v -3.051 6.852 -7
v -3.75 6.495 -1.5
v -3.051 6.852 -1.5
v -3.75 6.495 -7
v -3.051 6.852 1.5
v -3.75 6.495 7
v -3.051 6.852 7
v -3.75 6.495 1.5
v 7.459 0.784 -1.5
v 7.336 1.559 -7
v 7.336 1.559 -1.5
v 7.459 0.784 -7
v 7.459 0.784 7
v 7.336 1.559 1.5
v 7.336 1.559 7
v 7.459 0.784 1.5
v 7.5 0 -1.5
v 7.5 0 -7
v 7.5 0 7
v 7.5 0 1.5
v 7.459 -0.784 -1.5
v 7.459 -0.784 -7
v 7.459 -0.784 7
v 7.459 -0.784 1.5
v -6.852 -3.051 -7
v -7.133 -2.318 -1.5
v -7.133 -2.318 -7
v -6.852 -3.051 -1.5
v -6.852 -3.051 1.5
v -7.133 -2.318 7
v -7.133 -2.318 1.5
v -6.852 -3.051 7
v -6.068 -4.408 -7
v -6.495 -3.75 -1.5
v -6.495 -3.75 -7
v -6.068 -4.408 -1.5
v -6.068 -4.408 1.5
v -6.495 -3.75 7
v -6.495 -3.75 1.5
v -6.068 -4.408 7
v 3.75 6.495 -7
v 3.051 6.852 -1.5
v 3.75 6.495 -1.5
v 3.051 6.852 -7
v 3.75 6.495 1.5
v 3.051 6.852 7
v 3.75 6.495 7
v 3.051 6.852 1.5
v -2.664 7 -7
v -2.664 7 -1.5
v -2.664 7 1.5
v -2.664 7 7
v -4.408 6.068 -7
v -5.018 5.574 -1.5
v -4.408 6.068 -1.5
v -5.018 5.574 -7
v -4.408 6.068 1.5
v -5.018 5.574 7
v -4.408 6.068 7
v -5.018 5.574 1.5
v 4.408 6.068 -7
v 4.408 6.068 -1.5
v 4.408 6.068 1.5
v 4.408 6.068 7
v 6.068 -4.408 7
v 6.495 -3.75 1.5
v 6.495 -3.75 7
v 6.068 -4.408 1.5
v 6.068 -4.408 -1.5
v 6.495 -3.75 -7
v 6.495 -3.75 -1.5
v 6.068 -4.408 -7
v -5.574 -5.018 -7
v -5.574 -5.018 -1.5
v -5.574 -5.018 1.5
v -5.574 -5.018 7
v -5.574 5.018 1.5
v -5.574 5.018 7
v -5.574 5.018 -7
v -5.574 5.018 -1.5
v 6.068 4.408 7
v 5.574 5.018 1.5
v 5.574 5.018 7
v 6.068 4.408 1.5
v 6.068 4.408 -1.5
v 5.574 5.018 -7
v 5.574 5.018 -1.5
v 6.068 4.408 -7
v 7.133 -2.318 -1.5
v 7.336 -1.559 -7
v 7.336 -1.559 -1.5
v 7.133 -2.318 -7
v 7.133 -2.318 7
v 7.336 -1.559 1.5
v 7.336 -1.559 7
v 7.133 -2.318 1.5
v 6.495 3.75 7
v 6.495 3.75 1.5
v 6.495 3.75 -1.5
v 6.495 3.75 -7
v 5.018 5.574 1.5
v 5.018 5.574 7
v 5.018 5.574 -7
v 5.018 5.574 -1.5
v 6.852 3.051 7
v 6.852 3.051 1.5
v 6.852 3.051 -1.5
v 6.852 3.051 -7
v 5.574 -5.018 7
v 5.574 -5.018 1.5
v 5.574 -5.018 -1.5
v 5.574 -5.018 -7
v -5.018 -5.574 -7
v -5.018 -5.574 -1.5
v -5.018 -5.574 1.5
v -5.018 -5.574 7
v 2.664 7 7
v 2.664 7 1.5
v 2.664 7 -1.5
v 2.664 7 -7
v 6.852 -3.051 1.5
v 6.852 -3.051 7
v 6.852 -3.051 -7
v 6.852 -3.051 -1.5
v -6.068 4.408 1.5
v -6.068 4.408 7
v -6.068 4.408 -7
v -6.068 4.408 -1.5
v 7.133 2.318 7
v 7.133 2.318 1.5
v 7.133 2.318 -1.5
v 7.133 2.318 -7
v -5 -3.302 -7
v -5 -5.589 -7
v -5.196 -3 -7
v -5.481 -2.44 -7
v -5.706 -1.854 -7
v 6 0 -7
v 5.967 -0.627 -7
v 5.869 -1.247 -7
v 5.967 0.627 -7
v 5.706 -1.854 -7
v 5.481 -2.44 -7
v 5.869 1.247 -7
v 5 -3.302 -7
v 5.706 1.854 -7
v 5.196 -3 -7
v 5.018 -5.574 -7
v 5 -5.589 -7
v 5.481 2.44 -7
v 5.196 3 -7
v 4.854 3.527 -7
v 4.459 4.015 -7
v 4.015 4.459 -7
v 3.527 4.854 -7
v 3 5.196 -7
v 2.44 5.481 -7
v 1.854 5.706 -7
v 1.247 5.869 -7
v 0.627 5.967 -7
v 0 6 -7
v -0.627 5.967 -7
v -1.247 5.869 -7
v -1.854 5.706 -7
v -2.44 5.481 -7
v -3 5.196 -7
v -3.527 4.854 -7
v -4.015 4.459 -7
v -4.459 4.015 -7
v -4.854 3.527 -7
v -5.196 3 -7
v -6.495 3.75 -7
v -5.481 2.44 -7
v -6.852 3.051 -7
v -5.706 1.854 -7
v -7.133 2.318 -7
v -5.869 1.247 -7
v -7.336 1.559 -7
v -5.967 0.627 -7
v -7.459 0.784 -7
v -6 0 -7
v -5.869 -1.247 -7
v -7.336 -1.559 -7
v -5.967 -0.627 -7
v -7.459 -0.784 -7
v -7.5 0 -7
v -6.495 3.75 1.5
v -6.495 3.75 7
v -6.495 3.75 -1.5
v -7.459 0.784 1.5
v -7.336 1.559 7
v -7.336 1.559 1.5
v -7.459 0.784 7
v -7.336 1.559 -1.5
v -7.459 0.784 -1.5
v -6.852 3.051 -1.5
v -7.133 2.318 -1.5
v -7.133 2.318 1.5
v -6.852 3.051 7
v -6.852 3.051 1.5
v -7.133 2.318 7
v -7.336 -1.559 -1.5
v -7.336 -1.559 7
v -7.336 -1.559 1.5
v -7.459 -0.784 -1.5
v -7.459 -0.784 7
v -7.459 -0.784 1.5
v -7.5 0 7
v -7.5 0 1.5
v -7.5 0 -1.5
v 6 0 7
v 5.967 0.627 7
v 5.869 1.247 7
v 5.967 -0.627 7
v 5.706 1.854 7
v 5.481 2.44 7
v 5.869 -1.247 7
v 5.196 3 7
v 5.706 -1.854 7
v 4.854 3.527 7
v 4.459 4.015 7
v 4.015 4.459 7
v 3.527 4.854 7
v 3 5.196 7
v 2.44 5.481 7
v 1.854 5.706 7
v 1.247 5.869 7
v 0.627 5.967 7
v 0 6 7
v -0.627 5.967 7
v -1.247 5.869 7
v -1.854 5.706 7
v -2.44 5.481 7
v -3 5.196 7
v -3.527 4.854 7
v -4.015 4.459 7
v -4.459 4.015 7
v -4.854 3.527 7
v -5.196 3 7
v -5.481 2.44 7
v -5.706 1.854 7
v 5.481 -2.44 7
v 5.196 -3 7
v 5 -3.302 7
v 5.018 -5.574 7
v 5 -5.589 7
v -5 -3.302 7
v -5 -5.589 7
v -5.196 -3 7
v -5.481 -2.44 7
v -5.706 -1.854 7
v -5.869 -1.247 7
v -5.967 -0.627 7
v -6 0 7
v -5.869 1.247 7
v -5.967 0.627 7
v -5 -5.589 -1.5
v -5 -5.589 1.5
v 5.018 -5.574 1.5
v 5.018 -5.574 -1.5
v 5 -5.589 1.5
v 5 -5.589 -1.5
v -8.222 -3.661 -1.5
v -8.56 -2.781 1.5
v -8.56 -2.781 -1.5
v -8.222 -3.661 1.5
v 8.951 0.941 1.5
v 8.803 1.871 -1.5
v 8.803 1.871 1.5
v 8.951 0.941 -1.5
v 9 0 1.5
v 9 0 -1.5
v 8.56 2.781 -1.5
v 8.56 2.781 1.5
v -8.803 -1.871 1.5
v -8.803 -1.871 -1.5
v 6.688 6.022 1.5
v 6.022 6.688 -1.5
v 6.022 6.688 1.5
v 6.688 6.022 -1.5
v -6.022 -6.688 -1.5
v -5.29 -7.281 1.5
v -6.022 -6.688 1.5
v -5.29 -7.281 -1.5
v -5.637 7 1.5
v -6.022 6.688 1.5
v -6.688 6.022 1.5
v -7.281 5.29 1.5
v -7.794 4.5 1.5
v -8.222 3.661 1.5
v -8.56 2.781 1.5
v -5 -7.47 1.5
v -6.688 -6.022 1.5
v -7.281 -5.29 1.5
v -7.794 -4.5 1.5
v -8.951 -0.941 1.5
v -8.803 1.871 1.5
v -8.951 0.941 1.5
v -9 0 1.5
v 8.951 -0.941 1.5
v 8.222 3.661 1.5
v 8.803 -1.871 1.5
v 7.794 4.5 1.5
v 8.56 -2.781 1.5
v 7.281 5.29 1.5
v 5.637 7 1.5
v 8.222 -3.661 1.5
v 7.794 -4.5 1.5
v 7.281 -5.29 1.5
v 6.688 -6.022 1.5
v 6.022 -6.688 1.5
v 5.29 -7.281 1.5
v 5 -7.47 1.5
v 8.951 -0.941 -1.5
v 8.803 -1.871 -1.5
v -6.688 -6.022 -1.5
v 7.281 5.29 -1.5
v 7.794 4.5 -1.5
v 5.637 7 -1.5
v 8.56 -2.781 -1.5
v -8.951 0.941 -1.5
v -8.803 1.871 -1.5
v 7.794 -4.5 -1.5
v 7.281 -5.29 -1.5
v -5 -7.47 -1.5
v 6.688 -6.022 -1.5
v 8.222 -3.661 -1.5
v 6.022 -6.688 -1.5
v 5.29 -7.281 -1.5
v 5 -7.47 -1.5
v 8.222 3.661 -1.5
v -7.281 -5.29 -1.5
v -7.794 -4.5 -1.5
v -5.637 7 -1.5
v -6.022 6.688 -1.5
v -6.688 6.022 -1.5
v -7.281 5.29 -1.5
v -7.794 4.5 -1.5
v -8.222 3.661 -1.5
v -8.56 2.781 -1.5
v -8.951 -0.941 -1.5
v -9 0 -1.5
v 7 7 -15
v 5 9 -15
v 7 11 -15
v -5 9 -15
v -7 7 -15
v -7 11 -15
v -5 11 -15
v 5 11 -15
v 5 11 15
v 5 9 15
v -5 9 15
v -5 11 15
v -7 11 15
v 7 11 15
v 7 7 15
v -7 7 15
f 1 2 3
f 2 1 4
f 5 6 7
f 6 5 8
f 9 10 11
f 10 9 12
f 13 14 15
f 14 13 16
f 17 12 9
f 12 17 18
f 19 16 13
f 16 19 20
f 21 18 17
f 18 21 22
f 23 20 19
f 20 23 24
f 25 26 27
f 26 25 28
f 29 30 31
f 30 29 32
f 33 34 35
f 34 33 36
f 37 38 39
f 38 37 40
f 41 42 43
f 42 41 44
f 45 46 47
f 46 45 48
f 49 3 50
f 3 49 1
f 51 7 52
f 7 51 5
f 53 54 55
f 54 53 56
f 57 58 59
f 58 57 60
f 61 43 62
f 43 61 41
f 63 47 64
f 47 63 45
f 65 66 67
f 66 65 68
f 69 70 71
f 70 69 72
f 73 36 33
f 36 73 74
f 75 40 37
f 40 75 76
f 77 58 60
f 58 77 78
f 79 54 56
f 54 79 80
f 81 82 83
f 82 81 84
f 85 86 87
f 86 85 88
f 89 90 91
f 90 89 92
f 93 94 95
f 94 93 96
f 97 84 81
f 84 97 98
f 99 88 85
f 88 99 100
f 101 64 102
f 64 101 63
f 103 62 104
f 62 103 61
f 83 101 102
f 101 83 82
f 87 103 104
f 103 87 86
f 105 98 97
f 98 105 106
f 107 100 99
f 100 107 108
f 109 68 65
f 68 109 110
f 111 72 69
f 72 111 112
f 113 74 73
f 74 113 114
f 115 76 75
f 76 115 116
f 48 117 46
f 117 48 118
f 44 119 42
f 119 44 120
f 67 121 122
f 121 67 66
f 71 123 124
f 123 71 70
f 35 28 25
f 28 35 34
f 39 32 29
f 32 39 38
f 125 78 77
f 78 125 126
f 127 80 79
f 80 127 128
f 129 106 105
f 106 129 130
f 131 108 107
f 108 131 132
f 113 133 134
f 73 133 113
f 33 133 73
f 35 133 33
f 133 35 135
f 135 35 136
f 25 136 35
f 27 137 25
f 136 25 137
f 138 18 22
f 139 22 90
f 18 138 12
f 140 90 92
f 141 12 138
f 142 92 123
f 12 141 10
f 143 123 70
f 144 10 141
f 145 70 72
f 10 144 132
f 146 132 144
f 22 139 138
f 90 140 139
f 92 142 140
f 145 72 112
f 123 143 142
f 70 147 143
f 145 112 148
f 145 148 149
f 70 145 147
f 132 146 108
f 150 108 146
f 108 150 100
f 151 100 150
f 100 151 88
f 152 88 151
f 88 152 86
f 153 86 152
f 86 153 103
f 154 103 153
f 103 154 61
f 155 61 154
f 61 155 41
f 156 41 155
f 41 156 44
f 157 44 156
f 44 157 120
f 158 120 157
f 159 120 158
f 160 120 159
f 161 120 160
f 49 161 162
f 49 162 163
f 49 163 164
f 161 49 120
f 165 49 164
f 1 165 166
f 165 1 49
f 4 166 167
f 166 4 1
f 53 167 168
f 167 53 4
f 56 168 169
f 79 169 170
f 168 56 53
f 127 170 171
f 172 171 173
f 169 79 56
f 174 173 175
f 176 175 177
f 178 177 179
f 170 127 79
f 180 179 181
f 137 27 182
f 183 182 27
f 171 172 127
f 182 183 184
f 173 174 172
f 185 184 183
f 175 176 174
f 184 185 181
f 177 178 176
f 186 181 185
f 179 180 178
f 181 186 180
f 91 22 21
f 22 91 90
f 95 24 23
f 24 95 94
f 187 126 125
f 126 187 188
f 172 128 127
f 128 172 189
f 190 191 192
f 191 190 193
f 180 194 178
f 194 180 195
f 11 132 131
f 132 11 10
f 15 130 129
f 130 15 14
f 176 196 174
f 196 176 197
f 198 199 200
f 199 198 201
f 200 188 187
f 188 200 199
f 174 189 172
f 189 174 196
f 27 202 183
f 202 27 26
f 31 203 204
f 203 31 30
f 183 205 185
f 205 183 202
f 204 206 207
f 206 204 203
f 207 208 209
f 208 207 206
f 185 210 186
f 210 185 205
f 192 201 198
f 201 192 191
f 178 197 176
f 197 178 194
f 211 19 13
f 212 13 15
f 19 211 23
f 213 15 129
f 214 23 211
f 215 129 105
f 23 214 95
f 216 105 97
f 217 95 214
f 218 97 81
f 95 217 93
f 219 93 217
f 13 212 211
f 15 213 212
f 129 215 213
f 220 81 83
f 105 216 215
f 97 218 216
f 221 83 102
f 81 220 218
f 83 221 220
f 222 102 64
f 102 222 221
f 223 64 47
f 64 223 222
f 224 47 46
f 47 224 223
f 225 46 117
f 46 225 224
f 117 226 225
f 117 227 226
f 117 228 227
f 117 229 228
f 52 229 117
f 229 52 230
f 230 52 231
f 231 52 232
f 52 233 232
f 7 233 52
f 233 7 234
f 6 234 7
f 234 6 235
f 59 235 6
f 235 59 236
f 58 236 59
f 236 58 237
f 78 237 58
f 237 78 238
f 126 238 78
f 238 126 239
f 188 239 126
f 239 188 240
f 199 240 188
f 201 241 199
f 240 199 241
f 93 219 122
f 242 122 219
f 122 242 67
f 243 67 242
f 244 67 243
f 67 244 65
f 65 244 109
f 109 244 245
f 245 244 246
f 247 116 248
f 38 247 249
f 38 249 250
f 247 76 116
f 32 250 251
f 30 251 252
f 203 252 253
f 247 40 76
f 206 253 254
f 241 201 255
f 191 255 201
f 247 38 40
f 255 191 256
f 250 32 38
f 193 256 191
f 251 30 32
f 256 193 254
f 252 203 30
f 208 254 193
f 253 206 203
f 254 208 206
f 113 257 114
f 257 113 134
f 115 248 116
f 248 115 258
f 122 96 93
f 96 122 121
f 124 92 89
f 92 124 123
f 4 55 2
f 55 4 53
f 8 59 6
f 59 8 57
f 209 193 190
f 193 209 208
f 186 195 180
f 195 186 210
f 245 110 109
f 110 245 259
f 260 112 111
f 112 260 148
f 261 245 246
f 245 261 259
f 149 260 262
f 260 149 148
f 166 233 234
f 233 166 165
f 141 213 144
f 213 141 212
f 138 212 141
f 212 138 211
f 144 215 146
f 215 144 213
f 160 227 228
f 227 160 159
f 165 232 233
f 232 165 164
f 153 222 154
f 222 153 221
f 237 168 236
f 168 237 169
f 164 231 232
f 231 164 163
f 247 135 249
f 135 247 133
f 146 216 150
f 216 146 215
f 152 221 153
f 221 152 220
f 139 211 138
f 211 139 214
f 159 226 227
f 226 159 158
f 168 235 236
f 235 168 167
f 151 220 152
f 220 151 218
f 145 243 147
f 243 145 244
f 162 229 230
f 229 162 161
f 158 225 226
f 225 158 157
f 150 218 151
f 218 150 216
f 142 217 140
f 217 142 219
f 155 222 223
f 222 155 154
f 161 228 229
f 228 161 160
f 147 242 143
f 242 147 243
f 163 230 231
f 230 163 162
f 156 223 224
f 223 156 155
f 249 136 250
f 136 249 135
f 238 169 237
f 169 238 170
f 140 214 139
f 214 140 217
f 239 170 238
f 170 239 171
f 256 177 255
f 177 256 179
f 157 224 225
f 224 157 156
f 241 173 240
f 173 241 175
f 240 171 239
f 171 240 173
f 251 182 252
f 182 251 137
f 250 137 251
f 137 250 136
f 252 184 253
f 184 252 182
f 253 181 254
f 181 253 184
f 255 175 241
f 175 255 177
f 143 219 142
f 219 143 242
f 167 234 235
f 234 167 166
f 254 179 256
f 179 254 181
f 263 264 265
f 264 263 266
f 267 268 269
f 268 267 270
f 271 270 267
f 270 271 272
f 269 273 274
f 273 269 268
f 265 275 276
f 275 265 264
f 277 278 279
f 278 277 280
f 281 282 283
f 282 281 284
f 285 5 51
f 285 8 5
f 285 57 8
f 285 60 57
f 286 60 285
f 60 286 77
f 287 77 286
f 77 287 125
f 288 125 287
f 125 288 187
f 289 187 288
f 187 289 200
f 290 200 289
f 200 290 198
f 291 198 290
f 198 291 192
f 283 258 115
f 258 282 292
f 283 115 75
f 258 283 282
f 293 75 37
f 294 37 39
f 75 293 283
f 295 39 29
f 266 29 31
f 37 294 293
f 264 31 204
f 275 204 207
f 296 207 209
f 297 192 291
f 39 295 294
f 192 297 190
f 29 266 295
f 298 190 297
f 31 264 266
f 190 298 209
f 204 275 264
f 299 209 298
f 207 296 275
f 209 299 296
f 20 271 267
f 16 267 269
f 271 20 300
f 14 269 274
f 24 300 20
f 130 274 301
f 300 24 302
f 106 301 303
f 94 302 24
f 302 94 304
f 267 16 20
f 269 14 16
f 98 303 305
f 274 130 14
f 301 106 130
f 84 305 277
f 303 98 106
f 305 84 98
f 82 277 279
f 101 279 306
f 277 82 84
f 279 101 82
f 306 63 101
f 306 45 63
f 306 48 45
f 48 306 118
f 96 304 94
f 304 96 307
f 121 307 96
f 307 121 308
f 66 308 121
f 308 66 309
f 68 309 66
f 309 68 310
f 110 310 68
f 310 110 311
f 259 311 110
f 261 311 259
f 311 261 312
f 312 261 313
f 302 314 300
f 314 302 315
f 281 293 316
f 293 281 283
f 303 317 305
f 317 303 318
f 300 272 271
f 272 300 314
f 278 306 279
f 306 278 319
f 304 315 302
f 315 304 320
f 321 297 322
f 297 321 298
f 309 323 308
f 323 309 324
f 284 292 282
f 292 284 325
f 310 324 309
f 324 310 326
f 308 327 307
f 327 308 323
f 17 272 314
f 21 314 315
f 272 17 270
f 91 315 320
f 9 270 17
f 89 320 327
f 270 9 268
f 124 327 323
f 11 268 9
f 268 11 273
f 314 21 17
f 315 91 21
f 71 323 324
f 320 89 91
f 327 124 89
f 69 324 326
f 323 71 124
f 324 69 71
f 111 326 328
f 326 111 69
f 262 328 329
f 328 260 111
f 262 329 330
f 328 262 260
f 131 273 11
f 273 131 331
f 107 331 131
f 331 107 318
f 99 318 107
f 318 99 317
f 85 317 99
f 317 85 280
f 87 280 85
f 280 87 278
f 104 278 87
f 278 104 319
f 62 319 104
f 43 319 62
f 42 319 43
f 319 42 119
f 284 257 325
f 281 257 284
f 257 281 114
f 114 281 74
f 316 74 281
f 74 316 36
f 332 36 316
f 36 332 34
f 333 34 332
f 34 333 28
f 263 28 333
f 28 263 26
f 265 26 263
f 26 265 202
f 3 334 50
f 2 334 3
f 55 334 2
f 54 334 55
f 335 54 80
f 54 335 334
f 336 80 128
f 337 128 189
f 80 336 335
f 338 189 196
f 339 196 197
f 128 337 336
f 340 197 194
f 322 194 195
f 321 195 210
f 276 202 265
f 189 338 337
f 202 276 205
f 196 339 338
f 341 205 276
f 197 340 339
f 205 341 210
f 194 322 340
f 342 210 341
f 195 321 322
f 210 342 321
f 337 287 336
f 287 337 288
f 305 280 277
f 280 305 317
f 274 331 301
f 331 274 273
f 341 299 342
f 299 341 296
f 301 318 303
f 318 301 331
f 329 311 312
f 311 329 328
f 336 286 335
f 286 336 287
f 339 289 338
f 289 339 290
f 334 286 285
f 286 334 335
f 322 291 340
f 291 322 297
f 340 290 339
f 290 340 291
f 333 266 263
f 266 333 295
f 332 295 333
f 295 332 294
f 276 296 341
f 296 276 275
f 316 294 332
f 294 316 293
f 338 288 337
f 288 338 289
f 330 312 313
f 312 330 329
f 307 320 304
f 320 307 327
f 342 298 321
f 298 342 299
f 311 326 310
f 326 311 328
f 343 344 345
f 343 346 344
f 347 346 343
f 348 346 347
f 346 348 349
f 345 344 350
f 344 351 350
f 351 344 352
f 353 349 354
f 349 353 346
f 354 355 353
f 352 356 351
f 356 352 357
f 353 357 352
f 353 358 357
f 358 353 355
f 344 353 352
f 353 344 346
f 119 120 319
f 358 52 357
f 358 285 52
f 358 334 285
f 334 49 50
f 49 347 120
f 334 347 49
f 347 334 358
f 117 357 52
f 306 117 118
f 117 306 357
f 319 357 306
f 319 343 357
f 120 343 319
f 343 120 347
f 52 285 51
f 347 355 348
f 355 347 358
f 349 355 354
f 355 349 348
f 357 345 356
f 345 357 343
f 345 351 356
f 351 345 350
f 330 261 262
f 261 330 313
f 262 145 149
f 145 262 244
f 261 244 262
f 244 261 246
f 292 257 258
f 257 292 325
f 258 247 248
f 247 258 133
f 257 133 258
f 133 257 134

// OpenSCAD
// Laserlicht
$fn=60;

module Ring() {
    difference() {
        cylinder(d=15,h=14,center=true);
        cylinder(d=12,h=16,center=true);
    }
}

module Stabil() {
    difference() {
        cylinder(d=18,h=3,center=true);
        cylinder(d=12,h=4,center=true);
    }
}

module Mount() {
    translate([0,8,0])
    cube([30,2,10], center=true);
    translate([0,9,-6])
    cube([30,4,2], center=true);
    translate([0,9,6])
    cube([30,4,2], center=true);
}

module Fuge() {
    translate([0,-6,0])
    cube([10,10,40],center=true);
}


module Halter() {
    difference() {
        union() {
            Ring();
            Stabil();
            Mount();
        }
     Fuge();
    }
}


module Halter2() {
    difference() {
        union() {
            Ring();
            Stabil();
            rotate([0,90,0])
            Mount();
        }
     Fuge();
    }
}

Halter2();
